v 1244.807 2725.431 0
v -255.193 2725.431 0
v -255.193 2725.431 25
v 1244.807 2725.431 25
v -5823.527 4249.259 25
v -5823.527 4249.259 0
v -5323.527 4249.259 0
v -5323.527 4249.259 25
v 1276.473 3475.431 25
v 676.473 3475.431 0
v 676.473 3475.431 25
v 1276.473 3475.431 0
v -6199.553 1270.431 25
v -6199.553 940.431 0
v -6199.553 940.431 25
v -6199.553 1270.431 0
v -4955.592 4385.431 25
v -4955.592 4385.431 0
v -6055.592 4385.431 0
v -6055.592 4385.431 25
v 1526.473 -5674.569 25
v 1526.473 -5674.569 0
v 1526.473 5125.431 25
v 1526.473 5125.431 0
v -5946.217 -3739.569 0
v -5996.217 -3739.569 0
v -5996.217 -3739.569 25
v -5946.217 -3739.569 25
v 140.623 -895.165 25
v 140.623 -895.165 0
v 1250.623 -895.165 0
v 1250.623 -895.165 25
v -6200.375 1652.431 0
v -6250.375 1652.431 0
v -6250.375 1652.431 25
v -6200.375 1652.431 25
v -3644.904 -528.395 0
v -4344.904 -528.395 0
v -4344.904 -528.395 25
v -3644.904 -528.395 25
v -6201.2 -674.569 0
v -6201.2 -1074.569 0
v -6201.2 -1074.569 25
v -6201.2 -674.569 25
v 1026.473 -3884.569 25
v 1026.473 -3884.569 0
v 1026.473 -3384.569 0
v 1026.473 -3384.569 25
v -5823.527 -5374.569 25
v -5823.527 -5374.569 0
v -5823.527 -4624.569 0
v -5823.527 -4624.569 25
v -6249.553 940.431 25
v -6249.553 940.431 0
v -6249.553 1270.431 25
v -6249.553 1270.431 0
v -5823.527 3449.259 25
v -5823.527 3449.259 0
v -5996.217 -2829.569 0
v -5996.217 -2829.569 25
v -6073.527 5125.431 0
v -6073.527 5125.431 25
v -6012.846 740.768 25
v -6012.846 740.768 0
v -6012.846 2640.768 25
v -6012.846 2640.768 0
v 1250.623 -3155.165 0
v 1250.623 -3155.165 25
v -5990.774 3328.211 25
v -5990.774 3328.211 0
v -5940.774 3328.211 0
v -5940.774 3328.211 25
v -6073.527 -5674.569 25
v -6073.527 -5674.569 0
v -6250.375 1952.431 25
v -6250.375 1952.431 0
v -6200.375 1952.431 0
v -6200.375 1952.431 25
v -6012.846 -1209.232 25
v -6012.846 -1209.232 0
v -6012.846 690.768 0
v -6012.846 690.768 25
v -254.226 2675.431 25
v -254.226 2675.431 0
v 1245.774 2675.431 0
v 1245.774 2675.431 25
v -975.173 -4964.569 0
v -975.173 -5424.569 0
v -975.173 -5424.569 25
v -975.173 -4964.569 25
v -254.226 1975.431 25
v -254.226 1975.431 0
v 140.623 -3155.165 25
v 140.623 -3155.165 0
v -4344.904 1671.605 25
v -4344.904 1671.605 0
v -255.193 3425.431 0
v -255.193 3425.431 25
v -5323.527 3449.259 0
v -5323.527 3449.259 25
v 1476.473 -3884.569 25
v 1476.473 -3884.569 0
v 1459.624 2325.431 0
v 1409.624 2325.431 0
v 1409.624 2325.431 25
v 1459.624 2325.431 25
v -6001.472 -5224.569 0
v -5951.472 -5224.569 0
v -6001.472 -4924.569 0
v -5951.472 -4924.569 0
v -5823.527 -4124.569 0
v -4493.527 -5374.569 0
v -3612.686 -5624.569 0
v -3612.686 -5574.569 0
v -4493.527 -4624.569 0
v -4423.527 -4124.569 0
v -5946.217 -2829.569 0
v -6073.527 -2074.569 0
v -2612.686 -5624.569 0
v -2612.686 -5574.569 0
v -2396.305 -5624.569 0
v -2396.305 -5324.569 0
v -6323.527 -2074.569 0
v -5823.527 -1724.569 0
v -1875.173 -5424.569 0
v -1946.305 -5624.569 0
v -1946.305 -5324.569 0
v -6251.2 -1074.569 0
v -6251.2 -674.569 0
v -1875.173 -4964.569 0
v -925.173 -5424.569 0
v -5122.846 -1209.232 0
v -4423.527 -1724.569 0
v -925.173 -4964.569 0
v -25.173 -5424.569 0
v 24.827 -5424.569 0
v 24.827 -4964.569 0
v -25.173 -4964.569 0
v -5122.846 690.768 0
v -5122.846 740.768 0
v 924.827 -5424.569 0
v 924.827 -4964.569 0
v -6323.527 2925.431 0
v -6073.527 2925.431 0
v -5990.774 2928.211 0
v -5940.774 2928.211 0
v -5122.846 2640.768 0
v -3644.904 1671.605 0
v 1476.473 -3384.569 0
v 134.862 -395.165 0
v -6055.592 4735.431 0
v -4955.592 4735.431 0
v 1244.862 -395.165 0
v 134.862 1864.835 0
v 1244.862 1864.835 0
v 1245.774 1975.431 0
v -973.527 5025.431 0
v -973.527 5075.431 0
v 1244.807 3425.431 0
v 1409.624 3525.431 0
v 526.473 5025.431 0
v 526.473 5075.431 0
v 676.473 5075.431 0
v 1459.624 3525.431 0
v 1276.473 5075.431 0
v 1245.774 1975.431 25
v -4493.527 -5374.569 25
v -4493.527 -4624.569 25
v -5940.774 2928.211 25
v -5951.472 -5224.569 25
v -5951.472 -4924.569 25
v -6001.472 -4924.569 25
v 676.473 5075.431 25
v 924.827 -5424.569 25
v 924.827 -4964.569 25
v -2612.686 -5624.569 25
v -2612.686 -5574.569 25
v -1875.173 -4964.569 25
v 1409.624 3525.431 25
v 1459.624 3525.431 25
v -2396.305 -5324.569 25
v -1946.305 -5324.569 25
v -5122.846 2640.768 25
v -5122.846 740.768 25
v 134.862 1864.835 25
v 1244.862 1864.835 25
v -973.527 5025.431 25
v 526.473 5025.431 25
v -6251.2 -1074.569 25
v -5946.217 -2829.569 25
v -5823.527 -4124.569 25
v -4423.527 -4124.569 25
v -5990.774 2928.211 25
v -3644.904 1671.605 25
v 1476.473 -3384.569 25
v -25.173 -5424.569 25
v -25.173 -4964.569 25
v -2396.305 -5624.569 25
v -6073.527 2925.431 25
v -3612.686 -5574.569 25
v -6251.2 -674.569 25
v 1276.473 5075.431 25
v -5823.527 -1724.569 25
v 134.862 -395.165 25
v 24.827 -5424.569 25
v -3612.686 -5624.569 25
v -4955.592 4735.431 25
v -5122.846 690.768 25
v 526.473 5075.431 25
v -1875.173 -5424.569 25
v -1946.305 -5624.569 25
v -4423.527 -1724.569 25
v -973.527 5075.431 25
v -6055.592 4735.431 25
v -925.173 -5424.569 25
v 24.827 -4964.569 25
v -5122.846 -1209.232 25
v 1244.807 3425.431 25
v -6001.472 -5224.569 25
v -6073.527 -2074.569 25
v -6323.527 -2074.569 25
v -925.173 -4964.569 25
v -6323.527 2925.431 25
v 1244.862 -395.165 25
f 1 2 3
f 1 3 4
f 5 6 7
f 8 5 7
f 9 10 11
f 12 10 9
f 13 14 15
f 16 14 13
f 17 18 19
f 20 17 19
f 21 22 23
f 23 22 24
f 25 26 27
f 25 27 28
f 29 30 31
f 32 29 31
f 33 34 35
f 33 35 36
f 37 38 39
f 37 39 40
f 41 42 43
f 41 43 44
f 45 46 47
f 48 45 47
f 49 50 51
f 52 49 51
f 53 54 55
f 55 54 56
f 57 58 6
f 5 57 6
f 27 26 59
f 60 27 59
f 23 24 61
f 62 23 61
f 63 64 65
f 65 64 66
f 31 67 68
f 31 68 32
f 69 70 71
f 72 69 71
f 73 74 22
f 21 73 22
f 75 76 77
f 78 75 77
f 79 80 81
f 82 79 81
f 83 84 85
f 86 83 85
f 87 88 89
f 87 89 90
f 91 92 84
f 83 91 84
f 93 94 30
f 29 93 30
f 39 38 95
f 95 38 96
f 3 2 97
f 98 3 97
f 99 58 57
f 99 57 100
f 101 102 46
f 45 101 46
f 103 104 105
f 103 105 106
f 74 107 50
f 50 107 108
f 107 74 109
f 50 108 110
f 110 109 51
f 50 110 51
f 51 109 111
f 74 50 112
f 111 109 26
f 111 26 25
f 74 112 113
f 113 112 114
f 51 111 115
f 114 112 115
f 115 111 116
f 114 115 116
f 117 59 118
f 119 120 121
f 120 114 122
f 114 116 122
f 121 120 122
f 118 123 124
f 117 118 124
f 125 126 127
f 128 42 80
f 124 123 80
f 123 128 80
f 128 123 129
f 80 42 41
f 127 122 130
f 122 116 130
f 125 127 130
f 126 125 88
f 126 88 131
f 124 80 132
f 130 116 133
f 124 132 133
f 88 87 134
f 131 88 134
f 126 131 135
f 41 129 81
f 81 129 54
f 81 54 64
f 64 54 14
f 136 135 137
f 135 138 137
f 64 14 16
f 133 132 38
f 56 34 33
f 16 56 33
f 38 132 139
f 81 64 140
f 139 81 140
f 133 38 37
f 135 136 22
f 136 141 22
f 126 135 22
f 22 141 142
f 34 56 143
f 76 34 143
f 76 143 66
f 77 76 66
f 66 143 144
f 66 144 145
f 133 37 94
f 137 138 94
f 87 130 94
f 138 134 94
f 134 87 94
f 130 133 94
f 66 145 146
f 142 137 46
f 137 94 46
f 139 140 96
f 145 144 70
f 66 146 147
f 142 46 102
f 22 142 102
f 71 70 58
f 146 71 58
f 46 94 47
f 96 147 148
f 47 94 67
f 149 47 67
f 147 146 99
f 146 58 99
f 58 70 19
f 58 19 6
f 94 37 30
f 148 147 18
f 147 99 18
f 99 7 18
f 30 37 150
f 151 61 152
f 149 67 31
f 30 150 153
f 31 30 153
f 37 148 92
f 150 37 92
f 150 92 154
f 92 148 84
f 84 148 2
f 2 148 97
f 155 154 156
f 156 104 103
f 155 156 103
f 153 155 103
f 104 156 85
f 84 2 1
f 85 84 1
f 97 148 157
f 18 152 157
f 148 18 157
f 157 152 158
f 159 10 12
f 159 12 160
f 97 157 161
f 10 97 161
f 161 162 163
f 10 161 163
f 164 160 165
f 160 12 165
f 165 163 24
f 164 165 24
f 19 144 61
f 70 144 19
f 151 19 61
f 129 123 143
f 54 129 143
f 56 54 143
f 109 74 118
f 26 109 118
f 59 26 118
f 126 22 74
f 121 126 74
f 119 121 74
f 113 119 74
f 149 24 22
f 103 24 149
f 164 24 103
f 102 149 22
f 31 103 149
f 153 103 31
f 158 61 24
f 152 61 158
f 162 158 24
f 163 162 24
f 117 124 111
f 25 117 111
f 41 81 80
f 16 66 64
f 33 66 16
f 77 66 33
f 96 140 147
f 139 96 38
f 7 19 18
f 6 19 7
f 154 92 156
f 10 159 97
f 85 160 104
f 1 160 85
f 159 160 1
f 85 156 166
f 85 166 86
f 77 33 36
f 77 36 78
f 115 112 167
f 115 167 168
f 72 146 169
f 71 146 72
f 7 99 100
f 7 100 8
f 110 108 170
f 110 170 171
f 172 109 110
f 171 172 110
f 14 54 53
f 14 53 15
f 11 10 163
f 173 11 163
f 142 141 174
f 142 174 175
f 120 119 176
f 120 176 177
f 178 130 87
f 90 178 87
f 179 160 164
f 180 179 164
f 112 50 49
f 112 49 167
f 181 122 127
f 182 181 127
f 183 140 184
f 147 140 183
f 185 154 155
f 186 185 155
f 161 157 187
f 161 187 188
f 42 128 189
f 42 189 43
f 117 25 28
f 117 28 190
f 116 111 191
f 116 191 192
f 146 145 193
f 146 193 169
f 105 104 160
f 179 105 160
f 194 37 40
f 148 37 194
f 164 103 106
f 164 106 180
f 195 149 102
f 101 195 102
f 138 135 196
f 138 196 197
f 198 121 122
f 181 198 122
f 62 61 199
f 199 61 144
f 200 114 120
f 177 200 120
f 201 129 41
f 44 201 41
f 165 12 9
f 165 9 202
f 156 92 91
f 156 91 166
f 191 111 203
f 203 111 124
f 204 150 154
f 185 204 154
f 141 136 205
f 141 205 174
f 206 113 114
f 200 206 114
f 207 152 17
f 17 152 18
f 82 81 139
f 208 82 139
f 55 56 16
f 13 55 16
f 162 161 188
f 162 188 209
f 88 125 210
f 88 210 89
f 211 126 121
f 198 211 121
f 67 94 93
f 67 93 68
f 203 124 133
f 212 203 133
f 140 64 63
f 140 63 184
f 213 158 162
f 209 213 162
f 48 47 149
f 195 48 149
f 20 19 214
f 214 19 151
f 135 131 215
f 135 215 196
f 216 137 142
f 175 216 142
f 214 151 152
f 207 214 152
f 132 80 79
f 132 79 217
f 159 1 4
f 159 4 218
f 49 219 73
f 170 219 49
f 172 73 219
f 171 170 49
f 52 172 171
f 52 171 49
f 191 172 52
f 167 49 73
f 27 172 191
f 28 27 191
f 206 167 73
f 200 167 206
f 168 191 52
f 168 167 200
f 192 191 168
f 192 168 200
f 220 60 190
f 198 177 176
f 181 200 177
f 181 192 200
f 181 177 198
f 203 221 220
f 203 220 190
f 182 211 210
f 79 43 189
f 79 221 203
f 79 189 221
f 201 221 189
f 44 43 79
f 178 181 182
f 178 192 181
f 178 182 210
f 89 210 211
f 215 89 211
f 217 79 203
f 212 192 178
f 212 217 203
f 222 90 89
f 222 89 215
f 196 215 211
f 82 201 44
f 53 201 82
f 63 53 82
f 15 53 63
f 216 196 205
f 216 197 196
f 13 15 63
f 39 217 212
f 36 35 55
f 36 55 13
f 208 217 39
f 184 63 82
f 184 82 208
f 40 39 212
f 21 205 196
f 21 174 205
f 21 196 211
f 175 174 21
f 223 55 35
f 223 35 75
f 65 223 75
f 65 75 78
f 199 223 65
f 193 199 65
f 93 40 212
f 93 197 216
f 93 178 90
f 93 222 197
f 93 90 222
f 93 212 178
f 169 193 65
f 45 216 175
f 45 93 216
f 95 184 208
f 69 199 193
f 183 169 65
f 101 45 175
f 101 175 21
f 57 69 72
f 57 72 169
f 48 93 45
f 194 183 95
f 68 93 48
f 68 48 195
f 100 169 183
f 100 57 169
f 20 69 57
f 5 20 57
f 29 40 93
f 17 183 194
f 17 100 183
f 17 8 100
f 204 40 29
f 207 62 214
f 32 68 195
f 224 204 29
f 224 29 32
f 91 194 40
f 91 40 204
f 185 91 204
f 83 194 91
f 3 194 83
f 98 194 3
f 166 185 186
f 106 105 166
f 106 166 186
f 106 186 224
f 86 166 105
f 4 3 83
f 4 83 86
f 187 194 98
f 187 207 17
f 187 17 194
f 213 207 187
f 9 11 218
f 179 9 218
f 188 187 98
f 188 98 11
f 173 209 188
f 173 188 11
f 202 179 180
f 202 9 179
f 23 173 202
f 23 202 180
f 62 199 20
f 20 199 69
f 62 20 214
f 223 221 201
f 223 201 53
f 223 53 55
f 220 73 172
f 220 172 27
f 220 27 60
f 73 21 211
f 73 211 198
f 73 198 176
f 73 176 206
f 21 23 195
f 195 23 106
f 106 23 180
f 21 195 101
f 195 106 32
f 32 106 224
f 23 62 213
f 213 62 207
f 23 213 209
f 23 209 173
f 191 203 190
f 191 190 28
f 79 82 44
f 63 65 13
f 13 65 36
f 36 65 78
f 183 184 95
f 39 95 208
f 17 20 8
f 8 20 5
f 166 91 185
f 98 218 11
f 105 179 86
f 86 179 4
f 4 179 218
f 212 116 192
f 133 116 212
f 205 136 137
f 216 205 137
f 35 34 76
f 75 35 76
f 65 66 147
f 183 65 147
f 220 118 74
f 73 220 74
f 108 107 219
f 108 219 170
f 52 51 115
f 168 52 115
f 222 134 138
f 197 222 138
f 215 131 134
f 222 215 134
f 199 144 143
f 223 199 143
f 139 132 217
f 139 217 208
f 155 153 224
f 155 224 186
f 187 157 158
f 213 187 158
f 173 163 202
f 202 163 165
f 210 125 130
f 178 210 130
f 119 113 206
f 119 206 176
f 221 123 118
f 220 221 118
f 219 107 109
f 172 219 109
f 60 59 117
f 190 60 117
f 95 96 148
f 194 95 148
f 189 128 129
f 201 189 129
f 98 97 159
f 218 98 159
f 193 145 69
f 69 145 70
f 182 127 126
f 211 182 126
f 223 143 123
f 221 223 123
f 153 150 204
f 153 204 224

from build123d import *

# Parameters (mm, degrees)
F0_W     = 1330
F0_H     = 750
F0_W_2   = 1400
F0_H_2   = 2400
F0_W_3   = 900
F0_H_3   = 460
F0_W_4   = 1110
F0_H_4   = 2260
F0_W_5   = 890
F0_H_5   = 1900
F0_W_6   = 700
F0_H_6   = 2200
F0_W_7   = 500
F0_H_7   = 800
F0_W_8   = 1500
F0_H_8   = 700
F0_H_9   = 50
F0_W_9   = 600
F0_H_10  = 1600
F0_W_10  = 50
F0_H_11  = 300
F0_H_12  = 910
F0_W_11  = 1000
F0_H_13  = 400
F0_H_14  = 330
F0_H_15  = 1200
F1_DEPTH = 25


with BuildPart() as f1:
    # F0 (on Top) → F1 (new body)
    with BuildSketch(Plane.XY):
        Polygon((1326.473141, 5125.431383), (-5873.526859, 5125.431383), (-5873.526859, 4735.431383), (-4955.592155, 4735.431383), (-4955.592155, 4385.431383), (-5873.526859, 4385.431383), (-5873.526859, 2725.431383), (-6123.526859, 2725.431383), (-6123.526859, -1874.568617), (-5873.526859, -1874.568617), (-5873.526859, -5474.568617), (-2396.305084, -5474.568617), (-2396.305084, -5324.568617), (-1946.305084, -5324.568617), (-1946.305084, -5474.568617), (1326.473141, -5474.568617), (1326.473141, -3884.568617), (1026.473141, -3884.568617), (1026.473141, -3384.568617), (1326.473141, -3384.568617), align=None)
        with Locations((-5158.526859, -4999.568617)):
            Rectangle(F0_W, F0_H, mode=Mode.SUBTRACT)
        with Locations((-5123.526859, -2924.568617)):
            Rectangle(F0_W_2, F0_H_2, mode=Mode.SUBTRACT)
        with Locations((-1425.173283, -5194.568617)):
            Rectangle(F0_W_3, F0_H_3, mode=Mode.SUBTRACT)
        with Locations((-475.173283, -5194.568617)):
            Rectangle(F0_W_3, F0_H_3, mode=Mode.SUBTRACT)
        with Locations((474.826717, -5194.568617)):
            Rectangle(F0_W_3, F0_H_3, mode=Mode.SUBTRACT)
        with Locations((695.623219, -2025.164721)):
            Rectangle(F0_W_4, F0_H_4, mode=Mode.SUBTRACT)
        with Locations((-5567.845945, -259.231861)):
            Rectangle(F0_W_5, F0_H_5, mode=Mode.SUBTRACT)
        with Locations((-5567.845945, 1690.768139)):
            Rectangle(F0_W_5, F0_H_5, mode=Mode.SUBTRACT)
        with Locations((-3994.903898, 571.604729)):
            Rectangle(F0_W_6, F0_H_6, mode=Mode.SUBTRACT)
        with Locations((-5573.526859, 3849.259043)):
            Rectangle(F0_W_7, F0_H_7, mode=Mode.SUBTRACT)
        with Locations((689.861877, 734.835279)):
            Rectangle(F0_W_4, F0_H_4, mode=Mode.SUBTRACT)
        with Locations((495.773822, 2325.431383)):
            Rectangle(F0_W_8, F0_H_8, mode=Mode.SUBTRACT)
        with Locations((494.806796, 3075.431383)):
            Rectangle(F0_W_8, F0_H_8, mode=Mode.SUBTRACT)
        with Locations((-223.526859, 5050.431383)):
            Rectangle(F0_W_8, F0_H_9, mode=Mode.SUBTRACT)
        with Locations((976.473141, 4275.431383)):
            Rectangle(F0_W_9, F0_H_10, mode=Mode.SUBTRACT)
        Polygon((-5873.526859, 4735.431383), (-5873.526859, 5125.431383), (-6073.526859, 5125.431383), (-6073.526859, 2925.431383), (-6323.526859, 2925.431383), (-6323.526859, -2074.568617), (-6073.526859, -2074.568617), (-6073.526859, -5674.568617), (1526.473141, -5674.568617), (1526.473141, 5125.431383), (1326.473141, 5125.431383), (1326.473141, -3384.568617), (1476.473141, -3384.568617), (1476.473141, -3884.568617), (1326.473141, -3884.568617), (1326.473141, -5474.568617), (-1946.305084, -5474.568617), (-1946.305084, -5624.568617), (-2396.305084, -5624.568617), (-2396.305084, -5474.568617), (-5873.526859, -5474.568617), (-5873.526859, -1874.568617), (-6123.526859, -1874.568617), (-6123.526859, 2725.431383), (-5873.526859, 2725.431383), (-5873.526859, 4385.431383), (-6055.592155, 4385.431383), (-6055.592155, 4735.431383), align=None)
        with Locations((-5976.472282, -5074.568617)):
            Rectangle(F0_W_10, F0_H_11, mode=Mode.SUBTRACT)
        with Locations((-5971.216583, -3284.568617)):
            Rectangle(F0_W_10, F0_H_12, mode=Mode.SUBTRACT)
        with Locations((-3112.686396, -5599.568617)):
            Rectangle(F0_W_11, F0_H_9, mode=Mode.SUBTRACT)
        with Locations((-6226.200008, -874.568617)):
            Rectangle(F0_W_10, F0_H_13, mode=Mode.SUBTRACT)
        with Locations((-6224.552631, 1105.431383)):
            Rectangle(F0_W_10, F0_H_14, mode=Mode.SUBTRACT)
        with Locations((-6225.375414, 1802.431383)):
            Rectangle(F0_W_10, F0_H_11, mode=Mode.SUBTRACT)
        with Locations((-5965.773582, 3128.210723)):
            Rectangle(F0_W_10, F0_H_13, mode=Mode.SUBTRACT)
        with Locations((1434.623981, 2925.431383)):
            Rectangle(F0_W_10, F0_H_15, mode=Mode.SUBTRACT)
    extrude(amount=F1_DEPTH)


solid = f1.part
